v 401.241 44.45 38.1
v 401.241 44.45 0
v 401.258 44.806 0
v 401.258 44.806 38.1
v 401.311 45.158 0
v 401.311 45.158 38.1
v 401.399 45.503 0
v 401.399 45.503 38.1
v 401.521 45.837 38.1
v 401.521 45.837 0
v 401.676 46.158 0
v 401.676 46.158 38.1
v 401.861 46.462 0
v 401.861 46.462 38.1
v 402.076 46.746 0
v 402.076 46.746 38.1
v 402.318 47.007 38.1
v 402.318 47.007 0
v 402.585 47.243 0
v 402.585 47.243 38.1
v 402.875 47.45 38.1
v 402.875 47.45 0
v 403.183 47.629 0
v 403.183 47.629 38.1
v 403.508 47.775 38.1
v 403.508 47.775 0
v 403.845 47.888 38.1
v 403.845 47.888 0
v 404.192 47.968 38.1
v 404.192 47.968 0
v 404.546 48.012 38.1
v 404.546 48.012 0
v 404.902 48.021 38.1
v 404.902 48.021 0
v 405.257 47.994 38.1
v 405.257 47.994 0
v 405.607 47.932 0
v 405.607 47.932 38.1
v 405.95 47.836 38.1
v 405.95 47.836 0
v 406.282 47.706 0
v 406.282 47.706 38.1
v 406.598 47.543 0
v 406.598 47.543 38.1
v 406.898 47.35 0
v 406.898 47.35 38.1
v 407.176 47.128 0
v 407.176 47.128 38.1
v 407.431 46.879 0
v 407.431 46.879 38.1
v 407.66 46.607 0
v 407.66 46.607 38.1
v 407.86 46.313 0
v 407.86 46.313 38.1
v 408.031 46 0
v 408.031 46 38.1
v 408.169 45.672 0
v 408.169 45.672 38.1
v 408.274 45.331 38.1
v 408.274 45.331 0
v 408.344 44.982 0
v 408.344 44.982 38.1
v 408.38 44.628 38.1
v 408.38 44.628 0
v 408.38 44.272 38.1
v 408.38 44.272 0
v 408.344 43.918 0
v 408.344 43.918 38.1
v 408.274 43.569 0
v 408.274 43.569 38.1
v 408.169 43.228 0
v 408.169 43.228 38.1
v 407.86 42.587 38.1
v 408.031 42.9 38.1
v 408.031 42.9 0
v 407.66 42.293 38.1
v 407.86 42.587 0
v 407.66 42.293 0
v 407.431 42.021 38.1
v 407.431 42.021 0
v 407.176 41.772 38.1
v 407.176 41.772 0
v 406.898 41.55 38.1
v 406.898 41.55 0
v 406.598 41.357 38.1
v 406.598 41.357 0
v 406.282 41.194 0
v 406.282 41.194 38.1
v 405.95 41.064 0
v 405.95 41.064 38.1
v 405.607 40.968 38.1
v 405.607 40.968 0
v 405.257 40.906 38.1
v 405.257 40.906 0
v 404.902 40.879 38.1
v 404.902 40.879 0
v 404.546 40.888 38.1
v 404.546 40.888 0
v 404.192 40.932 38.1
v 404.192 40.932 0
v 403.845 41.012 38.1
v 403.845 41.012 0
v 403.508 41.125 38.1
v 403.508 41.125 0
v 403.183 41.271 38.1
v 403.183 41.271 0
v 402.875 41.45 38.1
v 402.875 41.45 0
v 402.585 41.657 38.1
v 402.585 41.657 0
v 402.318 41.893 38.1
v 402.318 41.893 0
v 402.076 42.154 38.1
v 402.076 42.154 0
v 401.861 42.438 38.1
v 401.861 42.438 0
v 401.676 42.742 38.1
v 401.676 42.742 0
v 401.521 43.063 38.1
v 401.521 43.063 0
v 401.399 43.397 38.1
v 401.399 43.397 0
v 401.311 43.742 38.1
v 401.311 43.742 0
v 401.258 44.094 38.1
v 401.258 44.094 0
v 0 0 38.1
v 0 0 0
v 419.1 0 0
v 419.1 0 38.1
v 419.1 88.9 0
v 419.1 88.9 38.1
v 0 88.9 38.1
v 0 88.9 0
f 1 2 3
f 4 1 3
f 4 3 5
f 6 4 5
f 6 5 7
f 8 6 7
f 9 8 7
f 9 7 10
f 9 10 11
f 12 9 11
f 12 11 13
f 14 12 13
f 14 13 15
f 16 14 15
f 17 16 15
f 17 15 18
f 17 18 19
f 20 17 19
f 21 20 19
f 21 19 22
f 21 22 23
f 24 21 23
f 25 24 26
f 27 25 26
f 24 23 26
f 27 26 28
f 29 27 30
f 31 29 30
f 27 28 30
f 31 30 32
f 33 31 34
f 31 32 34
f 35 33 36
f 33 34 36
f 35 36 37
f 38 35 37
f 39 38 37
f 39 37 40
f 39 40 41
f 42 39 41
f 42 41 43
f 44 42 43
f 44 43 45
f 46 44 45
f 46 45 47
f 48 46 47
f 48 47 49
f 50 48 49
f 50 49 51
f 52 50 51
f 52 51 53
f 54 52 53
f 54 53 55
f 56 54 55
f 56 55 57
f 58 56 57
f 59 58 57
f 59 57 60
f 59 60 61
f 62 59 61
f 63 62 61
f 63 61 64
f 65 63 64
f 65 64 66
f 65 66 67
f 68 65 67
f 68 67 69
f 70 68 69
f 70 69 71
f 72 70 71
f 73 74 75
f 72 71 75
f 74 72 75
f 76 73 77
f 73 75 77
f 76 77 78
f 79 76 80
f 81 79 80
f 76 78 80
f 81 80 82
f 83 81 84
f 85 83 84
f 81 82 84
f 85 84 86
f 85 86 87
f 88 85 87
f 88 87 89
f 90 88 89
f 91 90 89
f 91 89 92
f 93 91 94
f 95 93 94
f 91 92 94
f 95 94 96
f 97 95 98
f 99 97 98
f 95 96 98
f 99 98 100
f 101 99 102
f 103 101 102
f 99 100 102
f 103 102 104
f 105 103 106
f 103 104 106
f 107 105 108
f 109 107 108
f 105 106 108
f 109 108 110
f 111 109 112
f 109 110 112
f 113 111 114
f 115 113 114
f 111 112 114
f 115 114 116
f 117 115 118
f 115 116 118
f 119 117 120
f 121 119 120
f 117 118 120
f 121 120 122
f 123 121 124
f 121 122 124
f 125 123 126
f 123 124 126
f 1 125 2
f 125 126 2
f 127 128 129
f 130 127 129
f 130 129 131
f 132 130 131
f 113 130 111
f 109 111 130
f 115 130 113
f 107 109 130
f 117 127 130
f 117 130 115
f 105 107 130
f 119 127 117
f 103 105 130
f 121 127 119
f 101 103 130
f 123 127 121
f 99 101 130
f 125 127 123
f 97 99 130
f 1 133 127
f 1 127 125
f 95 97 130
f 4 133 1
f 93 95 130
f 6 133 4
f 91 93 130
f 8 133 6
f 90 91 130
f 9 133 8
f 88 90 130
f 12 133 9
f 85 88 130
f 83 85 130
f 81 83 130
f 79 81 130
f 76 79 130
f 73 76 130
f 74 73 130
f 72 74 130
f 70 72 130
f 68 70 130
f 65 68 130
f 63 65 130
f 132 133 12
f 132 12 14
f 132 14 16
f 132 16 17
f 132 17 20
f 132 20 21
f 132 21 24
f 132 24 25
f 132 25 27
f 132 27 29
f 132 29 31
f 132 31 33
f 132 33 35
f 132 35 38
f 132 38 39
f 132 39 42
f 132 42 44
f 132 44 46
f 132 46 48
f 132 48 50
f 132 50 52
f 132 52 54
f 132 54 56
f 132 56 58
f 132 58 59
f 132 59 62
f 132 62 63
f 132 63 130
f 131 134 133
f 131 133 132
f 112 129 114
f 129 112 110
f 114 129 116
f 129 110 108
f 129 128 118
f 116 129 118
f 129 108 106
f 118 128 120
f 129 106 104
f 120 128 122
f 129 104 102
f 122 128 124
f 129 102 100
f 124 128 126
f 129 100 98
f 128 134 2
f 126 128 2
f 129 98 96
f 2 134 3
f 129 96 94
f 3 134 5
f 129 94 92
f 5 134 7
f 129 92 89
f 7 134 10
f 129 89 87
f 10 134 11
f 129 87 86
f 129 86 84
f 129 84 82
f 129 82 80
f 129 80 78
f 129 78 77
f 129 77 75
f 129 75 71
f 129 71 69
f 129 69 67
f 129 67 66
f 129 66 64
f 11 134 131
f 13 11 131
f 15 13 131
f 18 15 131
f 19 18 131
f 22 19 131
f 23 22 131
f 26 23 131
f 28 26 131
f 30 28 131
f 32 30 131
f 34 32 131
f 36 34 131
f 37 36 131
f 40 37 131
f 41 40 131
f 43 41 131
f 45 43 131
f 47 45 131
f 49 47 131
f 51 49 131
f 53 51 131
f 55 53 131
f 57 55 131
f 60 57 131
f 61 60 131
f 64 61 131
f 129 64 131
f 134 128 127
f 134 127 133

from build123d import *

# Parameters (mm, degrees)
SKETCH1_W                       = 419.1
SKETCH1_H                       = 88.9
BOSS_EXTRUDE1_DEPTH             = 38.1
F_9_32_0_28125_DIAMETER_HOLE1_D = 7.14375


with BuildPart() as part:
    # Sketch1 → Boss-Extrude1 (new body)
    with BuildSketch(Plane.XY):
        with Locations((209.55, 44.45)):
            Rectangle(SKETCH1_W, SKETCH1_H)
    extrude(amount=BOSS_EXTRUDE1_DEPTH)

    # 9/32 (0.28125) Diameter Hole1 (through all)
    with Locations(Plane.XY.offset(38.1)):
        with Locations((404.8125, 44.45)):
            Hole(F_9_32_0_28125_DIAMETER_HOLE1_D / 2)


solid = part.part
